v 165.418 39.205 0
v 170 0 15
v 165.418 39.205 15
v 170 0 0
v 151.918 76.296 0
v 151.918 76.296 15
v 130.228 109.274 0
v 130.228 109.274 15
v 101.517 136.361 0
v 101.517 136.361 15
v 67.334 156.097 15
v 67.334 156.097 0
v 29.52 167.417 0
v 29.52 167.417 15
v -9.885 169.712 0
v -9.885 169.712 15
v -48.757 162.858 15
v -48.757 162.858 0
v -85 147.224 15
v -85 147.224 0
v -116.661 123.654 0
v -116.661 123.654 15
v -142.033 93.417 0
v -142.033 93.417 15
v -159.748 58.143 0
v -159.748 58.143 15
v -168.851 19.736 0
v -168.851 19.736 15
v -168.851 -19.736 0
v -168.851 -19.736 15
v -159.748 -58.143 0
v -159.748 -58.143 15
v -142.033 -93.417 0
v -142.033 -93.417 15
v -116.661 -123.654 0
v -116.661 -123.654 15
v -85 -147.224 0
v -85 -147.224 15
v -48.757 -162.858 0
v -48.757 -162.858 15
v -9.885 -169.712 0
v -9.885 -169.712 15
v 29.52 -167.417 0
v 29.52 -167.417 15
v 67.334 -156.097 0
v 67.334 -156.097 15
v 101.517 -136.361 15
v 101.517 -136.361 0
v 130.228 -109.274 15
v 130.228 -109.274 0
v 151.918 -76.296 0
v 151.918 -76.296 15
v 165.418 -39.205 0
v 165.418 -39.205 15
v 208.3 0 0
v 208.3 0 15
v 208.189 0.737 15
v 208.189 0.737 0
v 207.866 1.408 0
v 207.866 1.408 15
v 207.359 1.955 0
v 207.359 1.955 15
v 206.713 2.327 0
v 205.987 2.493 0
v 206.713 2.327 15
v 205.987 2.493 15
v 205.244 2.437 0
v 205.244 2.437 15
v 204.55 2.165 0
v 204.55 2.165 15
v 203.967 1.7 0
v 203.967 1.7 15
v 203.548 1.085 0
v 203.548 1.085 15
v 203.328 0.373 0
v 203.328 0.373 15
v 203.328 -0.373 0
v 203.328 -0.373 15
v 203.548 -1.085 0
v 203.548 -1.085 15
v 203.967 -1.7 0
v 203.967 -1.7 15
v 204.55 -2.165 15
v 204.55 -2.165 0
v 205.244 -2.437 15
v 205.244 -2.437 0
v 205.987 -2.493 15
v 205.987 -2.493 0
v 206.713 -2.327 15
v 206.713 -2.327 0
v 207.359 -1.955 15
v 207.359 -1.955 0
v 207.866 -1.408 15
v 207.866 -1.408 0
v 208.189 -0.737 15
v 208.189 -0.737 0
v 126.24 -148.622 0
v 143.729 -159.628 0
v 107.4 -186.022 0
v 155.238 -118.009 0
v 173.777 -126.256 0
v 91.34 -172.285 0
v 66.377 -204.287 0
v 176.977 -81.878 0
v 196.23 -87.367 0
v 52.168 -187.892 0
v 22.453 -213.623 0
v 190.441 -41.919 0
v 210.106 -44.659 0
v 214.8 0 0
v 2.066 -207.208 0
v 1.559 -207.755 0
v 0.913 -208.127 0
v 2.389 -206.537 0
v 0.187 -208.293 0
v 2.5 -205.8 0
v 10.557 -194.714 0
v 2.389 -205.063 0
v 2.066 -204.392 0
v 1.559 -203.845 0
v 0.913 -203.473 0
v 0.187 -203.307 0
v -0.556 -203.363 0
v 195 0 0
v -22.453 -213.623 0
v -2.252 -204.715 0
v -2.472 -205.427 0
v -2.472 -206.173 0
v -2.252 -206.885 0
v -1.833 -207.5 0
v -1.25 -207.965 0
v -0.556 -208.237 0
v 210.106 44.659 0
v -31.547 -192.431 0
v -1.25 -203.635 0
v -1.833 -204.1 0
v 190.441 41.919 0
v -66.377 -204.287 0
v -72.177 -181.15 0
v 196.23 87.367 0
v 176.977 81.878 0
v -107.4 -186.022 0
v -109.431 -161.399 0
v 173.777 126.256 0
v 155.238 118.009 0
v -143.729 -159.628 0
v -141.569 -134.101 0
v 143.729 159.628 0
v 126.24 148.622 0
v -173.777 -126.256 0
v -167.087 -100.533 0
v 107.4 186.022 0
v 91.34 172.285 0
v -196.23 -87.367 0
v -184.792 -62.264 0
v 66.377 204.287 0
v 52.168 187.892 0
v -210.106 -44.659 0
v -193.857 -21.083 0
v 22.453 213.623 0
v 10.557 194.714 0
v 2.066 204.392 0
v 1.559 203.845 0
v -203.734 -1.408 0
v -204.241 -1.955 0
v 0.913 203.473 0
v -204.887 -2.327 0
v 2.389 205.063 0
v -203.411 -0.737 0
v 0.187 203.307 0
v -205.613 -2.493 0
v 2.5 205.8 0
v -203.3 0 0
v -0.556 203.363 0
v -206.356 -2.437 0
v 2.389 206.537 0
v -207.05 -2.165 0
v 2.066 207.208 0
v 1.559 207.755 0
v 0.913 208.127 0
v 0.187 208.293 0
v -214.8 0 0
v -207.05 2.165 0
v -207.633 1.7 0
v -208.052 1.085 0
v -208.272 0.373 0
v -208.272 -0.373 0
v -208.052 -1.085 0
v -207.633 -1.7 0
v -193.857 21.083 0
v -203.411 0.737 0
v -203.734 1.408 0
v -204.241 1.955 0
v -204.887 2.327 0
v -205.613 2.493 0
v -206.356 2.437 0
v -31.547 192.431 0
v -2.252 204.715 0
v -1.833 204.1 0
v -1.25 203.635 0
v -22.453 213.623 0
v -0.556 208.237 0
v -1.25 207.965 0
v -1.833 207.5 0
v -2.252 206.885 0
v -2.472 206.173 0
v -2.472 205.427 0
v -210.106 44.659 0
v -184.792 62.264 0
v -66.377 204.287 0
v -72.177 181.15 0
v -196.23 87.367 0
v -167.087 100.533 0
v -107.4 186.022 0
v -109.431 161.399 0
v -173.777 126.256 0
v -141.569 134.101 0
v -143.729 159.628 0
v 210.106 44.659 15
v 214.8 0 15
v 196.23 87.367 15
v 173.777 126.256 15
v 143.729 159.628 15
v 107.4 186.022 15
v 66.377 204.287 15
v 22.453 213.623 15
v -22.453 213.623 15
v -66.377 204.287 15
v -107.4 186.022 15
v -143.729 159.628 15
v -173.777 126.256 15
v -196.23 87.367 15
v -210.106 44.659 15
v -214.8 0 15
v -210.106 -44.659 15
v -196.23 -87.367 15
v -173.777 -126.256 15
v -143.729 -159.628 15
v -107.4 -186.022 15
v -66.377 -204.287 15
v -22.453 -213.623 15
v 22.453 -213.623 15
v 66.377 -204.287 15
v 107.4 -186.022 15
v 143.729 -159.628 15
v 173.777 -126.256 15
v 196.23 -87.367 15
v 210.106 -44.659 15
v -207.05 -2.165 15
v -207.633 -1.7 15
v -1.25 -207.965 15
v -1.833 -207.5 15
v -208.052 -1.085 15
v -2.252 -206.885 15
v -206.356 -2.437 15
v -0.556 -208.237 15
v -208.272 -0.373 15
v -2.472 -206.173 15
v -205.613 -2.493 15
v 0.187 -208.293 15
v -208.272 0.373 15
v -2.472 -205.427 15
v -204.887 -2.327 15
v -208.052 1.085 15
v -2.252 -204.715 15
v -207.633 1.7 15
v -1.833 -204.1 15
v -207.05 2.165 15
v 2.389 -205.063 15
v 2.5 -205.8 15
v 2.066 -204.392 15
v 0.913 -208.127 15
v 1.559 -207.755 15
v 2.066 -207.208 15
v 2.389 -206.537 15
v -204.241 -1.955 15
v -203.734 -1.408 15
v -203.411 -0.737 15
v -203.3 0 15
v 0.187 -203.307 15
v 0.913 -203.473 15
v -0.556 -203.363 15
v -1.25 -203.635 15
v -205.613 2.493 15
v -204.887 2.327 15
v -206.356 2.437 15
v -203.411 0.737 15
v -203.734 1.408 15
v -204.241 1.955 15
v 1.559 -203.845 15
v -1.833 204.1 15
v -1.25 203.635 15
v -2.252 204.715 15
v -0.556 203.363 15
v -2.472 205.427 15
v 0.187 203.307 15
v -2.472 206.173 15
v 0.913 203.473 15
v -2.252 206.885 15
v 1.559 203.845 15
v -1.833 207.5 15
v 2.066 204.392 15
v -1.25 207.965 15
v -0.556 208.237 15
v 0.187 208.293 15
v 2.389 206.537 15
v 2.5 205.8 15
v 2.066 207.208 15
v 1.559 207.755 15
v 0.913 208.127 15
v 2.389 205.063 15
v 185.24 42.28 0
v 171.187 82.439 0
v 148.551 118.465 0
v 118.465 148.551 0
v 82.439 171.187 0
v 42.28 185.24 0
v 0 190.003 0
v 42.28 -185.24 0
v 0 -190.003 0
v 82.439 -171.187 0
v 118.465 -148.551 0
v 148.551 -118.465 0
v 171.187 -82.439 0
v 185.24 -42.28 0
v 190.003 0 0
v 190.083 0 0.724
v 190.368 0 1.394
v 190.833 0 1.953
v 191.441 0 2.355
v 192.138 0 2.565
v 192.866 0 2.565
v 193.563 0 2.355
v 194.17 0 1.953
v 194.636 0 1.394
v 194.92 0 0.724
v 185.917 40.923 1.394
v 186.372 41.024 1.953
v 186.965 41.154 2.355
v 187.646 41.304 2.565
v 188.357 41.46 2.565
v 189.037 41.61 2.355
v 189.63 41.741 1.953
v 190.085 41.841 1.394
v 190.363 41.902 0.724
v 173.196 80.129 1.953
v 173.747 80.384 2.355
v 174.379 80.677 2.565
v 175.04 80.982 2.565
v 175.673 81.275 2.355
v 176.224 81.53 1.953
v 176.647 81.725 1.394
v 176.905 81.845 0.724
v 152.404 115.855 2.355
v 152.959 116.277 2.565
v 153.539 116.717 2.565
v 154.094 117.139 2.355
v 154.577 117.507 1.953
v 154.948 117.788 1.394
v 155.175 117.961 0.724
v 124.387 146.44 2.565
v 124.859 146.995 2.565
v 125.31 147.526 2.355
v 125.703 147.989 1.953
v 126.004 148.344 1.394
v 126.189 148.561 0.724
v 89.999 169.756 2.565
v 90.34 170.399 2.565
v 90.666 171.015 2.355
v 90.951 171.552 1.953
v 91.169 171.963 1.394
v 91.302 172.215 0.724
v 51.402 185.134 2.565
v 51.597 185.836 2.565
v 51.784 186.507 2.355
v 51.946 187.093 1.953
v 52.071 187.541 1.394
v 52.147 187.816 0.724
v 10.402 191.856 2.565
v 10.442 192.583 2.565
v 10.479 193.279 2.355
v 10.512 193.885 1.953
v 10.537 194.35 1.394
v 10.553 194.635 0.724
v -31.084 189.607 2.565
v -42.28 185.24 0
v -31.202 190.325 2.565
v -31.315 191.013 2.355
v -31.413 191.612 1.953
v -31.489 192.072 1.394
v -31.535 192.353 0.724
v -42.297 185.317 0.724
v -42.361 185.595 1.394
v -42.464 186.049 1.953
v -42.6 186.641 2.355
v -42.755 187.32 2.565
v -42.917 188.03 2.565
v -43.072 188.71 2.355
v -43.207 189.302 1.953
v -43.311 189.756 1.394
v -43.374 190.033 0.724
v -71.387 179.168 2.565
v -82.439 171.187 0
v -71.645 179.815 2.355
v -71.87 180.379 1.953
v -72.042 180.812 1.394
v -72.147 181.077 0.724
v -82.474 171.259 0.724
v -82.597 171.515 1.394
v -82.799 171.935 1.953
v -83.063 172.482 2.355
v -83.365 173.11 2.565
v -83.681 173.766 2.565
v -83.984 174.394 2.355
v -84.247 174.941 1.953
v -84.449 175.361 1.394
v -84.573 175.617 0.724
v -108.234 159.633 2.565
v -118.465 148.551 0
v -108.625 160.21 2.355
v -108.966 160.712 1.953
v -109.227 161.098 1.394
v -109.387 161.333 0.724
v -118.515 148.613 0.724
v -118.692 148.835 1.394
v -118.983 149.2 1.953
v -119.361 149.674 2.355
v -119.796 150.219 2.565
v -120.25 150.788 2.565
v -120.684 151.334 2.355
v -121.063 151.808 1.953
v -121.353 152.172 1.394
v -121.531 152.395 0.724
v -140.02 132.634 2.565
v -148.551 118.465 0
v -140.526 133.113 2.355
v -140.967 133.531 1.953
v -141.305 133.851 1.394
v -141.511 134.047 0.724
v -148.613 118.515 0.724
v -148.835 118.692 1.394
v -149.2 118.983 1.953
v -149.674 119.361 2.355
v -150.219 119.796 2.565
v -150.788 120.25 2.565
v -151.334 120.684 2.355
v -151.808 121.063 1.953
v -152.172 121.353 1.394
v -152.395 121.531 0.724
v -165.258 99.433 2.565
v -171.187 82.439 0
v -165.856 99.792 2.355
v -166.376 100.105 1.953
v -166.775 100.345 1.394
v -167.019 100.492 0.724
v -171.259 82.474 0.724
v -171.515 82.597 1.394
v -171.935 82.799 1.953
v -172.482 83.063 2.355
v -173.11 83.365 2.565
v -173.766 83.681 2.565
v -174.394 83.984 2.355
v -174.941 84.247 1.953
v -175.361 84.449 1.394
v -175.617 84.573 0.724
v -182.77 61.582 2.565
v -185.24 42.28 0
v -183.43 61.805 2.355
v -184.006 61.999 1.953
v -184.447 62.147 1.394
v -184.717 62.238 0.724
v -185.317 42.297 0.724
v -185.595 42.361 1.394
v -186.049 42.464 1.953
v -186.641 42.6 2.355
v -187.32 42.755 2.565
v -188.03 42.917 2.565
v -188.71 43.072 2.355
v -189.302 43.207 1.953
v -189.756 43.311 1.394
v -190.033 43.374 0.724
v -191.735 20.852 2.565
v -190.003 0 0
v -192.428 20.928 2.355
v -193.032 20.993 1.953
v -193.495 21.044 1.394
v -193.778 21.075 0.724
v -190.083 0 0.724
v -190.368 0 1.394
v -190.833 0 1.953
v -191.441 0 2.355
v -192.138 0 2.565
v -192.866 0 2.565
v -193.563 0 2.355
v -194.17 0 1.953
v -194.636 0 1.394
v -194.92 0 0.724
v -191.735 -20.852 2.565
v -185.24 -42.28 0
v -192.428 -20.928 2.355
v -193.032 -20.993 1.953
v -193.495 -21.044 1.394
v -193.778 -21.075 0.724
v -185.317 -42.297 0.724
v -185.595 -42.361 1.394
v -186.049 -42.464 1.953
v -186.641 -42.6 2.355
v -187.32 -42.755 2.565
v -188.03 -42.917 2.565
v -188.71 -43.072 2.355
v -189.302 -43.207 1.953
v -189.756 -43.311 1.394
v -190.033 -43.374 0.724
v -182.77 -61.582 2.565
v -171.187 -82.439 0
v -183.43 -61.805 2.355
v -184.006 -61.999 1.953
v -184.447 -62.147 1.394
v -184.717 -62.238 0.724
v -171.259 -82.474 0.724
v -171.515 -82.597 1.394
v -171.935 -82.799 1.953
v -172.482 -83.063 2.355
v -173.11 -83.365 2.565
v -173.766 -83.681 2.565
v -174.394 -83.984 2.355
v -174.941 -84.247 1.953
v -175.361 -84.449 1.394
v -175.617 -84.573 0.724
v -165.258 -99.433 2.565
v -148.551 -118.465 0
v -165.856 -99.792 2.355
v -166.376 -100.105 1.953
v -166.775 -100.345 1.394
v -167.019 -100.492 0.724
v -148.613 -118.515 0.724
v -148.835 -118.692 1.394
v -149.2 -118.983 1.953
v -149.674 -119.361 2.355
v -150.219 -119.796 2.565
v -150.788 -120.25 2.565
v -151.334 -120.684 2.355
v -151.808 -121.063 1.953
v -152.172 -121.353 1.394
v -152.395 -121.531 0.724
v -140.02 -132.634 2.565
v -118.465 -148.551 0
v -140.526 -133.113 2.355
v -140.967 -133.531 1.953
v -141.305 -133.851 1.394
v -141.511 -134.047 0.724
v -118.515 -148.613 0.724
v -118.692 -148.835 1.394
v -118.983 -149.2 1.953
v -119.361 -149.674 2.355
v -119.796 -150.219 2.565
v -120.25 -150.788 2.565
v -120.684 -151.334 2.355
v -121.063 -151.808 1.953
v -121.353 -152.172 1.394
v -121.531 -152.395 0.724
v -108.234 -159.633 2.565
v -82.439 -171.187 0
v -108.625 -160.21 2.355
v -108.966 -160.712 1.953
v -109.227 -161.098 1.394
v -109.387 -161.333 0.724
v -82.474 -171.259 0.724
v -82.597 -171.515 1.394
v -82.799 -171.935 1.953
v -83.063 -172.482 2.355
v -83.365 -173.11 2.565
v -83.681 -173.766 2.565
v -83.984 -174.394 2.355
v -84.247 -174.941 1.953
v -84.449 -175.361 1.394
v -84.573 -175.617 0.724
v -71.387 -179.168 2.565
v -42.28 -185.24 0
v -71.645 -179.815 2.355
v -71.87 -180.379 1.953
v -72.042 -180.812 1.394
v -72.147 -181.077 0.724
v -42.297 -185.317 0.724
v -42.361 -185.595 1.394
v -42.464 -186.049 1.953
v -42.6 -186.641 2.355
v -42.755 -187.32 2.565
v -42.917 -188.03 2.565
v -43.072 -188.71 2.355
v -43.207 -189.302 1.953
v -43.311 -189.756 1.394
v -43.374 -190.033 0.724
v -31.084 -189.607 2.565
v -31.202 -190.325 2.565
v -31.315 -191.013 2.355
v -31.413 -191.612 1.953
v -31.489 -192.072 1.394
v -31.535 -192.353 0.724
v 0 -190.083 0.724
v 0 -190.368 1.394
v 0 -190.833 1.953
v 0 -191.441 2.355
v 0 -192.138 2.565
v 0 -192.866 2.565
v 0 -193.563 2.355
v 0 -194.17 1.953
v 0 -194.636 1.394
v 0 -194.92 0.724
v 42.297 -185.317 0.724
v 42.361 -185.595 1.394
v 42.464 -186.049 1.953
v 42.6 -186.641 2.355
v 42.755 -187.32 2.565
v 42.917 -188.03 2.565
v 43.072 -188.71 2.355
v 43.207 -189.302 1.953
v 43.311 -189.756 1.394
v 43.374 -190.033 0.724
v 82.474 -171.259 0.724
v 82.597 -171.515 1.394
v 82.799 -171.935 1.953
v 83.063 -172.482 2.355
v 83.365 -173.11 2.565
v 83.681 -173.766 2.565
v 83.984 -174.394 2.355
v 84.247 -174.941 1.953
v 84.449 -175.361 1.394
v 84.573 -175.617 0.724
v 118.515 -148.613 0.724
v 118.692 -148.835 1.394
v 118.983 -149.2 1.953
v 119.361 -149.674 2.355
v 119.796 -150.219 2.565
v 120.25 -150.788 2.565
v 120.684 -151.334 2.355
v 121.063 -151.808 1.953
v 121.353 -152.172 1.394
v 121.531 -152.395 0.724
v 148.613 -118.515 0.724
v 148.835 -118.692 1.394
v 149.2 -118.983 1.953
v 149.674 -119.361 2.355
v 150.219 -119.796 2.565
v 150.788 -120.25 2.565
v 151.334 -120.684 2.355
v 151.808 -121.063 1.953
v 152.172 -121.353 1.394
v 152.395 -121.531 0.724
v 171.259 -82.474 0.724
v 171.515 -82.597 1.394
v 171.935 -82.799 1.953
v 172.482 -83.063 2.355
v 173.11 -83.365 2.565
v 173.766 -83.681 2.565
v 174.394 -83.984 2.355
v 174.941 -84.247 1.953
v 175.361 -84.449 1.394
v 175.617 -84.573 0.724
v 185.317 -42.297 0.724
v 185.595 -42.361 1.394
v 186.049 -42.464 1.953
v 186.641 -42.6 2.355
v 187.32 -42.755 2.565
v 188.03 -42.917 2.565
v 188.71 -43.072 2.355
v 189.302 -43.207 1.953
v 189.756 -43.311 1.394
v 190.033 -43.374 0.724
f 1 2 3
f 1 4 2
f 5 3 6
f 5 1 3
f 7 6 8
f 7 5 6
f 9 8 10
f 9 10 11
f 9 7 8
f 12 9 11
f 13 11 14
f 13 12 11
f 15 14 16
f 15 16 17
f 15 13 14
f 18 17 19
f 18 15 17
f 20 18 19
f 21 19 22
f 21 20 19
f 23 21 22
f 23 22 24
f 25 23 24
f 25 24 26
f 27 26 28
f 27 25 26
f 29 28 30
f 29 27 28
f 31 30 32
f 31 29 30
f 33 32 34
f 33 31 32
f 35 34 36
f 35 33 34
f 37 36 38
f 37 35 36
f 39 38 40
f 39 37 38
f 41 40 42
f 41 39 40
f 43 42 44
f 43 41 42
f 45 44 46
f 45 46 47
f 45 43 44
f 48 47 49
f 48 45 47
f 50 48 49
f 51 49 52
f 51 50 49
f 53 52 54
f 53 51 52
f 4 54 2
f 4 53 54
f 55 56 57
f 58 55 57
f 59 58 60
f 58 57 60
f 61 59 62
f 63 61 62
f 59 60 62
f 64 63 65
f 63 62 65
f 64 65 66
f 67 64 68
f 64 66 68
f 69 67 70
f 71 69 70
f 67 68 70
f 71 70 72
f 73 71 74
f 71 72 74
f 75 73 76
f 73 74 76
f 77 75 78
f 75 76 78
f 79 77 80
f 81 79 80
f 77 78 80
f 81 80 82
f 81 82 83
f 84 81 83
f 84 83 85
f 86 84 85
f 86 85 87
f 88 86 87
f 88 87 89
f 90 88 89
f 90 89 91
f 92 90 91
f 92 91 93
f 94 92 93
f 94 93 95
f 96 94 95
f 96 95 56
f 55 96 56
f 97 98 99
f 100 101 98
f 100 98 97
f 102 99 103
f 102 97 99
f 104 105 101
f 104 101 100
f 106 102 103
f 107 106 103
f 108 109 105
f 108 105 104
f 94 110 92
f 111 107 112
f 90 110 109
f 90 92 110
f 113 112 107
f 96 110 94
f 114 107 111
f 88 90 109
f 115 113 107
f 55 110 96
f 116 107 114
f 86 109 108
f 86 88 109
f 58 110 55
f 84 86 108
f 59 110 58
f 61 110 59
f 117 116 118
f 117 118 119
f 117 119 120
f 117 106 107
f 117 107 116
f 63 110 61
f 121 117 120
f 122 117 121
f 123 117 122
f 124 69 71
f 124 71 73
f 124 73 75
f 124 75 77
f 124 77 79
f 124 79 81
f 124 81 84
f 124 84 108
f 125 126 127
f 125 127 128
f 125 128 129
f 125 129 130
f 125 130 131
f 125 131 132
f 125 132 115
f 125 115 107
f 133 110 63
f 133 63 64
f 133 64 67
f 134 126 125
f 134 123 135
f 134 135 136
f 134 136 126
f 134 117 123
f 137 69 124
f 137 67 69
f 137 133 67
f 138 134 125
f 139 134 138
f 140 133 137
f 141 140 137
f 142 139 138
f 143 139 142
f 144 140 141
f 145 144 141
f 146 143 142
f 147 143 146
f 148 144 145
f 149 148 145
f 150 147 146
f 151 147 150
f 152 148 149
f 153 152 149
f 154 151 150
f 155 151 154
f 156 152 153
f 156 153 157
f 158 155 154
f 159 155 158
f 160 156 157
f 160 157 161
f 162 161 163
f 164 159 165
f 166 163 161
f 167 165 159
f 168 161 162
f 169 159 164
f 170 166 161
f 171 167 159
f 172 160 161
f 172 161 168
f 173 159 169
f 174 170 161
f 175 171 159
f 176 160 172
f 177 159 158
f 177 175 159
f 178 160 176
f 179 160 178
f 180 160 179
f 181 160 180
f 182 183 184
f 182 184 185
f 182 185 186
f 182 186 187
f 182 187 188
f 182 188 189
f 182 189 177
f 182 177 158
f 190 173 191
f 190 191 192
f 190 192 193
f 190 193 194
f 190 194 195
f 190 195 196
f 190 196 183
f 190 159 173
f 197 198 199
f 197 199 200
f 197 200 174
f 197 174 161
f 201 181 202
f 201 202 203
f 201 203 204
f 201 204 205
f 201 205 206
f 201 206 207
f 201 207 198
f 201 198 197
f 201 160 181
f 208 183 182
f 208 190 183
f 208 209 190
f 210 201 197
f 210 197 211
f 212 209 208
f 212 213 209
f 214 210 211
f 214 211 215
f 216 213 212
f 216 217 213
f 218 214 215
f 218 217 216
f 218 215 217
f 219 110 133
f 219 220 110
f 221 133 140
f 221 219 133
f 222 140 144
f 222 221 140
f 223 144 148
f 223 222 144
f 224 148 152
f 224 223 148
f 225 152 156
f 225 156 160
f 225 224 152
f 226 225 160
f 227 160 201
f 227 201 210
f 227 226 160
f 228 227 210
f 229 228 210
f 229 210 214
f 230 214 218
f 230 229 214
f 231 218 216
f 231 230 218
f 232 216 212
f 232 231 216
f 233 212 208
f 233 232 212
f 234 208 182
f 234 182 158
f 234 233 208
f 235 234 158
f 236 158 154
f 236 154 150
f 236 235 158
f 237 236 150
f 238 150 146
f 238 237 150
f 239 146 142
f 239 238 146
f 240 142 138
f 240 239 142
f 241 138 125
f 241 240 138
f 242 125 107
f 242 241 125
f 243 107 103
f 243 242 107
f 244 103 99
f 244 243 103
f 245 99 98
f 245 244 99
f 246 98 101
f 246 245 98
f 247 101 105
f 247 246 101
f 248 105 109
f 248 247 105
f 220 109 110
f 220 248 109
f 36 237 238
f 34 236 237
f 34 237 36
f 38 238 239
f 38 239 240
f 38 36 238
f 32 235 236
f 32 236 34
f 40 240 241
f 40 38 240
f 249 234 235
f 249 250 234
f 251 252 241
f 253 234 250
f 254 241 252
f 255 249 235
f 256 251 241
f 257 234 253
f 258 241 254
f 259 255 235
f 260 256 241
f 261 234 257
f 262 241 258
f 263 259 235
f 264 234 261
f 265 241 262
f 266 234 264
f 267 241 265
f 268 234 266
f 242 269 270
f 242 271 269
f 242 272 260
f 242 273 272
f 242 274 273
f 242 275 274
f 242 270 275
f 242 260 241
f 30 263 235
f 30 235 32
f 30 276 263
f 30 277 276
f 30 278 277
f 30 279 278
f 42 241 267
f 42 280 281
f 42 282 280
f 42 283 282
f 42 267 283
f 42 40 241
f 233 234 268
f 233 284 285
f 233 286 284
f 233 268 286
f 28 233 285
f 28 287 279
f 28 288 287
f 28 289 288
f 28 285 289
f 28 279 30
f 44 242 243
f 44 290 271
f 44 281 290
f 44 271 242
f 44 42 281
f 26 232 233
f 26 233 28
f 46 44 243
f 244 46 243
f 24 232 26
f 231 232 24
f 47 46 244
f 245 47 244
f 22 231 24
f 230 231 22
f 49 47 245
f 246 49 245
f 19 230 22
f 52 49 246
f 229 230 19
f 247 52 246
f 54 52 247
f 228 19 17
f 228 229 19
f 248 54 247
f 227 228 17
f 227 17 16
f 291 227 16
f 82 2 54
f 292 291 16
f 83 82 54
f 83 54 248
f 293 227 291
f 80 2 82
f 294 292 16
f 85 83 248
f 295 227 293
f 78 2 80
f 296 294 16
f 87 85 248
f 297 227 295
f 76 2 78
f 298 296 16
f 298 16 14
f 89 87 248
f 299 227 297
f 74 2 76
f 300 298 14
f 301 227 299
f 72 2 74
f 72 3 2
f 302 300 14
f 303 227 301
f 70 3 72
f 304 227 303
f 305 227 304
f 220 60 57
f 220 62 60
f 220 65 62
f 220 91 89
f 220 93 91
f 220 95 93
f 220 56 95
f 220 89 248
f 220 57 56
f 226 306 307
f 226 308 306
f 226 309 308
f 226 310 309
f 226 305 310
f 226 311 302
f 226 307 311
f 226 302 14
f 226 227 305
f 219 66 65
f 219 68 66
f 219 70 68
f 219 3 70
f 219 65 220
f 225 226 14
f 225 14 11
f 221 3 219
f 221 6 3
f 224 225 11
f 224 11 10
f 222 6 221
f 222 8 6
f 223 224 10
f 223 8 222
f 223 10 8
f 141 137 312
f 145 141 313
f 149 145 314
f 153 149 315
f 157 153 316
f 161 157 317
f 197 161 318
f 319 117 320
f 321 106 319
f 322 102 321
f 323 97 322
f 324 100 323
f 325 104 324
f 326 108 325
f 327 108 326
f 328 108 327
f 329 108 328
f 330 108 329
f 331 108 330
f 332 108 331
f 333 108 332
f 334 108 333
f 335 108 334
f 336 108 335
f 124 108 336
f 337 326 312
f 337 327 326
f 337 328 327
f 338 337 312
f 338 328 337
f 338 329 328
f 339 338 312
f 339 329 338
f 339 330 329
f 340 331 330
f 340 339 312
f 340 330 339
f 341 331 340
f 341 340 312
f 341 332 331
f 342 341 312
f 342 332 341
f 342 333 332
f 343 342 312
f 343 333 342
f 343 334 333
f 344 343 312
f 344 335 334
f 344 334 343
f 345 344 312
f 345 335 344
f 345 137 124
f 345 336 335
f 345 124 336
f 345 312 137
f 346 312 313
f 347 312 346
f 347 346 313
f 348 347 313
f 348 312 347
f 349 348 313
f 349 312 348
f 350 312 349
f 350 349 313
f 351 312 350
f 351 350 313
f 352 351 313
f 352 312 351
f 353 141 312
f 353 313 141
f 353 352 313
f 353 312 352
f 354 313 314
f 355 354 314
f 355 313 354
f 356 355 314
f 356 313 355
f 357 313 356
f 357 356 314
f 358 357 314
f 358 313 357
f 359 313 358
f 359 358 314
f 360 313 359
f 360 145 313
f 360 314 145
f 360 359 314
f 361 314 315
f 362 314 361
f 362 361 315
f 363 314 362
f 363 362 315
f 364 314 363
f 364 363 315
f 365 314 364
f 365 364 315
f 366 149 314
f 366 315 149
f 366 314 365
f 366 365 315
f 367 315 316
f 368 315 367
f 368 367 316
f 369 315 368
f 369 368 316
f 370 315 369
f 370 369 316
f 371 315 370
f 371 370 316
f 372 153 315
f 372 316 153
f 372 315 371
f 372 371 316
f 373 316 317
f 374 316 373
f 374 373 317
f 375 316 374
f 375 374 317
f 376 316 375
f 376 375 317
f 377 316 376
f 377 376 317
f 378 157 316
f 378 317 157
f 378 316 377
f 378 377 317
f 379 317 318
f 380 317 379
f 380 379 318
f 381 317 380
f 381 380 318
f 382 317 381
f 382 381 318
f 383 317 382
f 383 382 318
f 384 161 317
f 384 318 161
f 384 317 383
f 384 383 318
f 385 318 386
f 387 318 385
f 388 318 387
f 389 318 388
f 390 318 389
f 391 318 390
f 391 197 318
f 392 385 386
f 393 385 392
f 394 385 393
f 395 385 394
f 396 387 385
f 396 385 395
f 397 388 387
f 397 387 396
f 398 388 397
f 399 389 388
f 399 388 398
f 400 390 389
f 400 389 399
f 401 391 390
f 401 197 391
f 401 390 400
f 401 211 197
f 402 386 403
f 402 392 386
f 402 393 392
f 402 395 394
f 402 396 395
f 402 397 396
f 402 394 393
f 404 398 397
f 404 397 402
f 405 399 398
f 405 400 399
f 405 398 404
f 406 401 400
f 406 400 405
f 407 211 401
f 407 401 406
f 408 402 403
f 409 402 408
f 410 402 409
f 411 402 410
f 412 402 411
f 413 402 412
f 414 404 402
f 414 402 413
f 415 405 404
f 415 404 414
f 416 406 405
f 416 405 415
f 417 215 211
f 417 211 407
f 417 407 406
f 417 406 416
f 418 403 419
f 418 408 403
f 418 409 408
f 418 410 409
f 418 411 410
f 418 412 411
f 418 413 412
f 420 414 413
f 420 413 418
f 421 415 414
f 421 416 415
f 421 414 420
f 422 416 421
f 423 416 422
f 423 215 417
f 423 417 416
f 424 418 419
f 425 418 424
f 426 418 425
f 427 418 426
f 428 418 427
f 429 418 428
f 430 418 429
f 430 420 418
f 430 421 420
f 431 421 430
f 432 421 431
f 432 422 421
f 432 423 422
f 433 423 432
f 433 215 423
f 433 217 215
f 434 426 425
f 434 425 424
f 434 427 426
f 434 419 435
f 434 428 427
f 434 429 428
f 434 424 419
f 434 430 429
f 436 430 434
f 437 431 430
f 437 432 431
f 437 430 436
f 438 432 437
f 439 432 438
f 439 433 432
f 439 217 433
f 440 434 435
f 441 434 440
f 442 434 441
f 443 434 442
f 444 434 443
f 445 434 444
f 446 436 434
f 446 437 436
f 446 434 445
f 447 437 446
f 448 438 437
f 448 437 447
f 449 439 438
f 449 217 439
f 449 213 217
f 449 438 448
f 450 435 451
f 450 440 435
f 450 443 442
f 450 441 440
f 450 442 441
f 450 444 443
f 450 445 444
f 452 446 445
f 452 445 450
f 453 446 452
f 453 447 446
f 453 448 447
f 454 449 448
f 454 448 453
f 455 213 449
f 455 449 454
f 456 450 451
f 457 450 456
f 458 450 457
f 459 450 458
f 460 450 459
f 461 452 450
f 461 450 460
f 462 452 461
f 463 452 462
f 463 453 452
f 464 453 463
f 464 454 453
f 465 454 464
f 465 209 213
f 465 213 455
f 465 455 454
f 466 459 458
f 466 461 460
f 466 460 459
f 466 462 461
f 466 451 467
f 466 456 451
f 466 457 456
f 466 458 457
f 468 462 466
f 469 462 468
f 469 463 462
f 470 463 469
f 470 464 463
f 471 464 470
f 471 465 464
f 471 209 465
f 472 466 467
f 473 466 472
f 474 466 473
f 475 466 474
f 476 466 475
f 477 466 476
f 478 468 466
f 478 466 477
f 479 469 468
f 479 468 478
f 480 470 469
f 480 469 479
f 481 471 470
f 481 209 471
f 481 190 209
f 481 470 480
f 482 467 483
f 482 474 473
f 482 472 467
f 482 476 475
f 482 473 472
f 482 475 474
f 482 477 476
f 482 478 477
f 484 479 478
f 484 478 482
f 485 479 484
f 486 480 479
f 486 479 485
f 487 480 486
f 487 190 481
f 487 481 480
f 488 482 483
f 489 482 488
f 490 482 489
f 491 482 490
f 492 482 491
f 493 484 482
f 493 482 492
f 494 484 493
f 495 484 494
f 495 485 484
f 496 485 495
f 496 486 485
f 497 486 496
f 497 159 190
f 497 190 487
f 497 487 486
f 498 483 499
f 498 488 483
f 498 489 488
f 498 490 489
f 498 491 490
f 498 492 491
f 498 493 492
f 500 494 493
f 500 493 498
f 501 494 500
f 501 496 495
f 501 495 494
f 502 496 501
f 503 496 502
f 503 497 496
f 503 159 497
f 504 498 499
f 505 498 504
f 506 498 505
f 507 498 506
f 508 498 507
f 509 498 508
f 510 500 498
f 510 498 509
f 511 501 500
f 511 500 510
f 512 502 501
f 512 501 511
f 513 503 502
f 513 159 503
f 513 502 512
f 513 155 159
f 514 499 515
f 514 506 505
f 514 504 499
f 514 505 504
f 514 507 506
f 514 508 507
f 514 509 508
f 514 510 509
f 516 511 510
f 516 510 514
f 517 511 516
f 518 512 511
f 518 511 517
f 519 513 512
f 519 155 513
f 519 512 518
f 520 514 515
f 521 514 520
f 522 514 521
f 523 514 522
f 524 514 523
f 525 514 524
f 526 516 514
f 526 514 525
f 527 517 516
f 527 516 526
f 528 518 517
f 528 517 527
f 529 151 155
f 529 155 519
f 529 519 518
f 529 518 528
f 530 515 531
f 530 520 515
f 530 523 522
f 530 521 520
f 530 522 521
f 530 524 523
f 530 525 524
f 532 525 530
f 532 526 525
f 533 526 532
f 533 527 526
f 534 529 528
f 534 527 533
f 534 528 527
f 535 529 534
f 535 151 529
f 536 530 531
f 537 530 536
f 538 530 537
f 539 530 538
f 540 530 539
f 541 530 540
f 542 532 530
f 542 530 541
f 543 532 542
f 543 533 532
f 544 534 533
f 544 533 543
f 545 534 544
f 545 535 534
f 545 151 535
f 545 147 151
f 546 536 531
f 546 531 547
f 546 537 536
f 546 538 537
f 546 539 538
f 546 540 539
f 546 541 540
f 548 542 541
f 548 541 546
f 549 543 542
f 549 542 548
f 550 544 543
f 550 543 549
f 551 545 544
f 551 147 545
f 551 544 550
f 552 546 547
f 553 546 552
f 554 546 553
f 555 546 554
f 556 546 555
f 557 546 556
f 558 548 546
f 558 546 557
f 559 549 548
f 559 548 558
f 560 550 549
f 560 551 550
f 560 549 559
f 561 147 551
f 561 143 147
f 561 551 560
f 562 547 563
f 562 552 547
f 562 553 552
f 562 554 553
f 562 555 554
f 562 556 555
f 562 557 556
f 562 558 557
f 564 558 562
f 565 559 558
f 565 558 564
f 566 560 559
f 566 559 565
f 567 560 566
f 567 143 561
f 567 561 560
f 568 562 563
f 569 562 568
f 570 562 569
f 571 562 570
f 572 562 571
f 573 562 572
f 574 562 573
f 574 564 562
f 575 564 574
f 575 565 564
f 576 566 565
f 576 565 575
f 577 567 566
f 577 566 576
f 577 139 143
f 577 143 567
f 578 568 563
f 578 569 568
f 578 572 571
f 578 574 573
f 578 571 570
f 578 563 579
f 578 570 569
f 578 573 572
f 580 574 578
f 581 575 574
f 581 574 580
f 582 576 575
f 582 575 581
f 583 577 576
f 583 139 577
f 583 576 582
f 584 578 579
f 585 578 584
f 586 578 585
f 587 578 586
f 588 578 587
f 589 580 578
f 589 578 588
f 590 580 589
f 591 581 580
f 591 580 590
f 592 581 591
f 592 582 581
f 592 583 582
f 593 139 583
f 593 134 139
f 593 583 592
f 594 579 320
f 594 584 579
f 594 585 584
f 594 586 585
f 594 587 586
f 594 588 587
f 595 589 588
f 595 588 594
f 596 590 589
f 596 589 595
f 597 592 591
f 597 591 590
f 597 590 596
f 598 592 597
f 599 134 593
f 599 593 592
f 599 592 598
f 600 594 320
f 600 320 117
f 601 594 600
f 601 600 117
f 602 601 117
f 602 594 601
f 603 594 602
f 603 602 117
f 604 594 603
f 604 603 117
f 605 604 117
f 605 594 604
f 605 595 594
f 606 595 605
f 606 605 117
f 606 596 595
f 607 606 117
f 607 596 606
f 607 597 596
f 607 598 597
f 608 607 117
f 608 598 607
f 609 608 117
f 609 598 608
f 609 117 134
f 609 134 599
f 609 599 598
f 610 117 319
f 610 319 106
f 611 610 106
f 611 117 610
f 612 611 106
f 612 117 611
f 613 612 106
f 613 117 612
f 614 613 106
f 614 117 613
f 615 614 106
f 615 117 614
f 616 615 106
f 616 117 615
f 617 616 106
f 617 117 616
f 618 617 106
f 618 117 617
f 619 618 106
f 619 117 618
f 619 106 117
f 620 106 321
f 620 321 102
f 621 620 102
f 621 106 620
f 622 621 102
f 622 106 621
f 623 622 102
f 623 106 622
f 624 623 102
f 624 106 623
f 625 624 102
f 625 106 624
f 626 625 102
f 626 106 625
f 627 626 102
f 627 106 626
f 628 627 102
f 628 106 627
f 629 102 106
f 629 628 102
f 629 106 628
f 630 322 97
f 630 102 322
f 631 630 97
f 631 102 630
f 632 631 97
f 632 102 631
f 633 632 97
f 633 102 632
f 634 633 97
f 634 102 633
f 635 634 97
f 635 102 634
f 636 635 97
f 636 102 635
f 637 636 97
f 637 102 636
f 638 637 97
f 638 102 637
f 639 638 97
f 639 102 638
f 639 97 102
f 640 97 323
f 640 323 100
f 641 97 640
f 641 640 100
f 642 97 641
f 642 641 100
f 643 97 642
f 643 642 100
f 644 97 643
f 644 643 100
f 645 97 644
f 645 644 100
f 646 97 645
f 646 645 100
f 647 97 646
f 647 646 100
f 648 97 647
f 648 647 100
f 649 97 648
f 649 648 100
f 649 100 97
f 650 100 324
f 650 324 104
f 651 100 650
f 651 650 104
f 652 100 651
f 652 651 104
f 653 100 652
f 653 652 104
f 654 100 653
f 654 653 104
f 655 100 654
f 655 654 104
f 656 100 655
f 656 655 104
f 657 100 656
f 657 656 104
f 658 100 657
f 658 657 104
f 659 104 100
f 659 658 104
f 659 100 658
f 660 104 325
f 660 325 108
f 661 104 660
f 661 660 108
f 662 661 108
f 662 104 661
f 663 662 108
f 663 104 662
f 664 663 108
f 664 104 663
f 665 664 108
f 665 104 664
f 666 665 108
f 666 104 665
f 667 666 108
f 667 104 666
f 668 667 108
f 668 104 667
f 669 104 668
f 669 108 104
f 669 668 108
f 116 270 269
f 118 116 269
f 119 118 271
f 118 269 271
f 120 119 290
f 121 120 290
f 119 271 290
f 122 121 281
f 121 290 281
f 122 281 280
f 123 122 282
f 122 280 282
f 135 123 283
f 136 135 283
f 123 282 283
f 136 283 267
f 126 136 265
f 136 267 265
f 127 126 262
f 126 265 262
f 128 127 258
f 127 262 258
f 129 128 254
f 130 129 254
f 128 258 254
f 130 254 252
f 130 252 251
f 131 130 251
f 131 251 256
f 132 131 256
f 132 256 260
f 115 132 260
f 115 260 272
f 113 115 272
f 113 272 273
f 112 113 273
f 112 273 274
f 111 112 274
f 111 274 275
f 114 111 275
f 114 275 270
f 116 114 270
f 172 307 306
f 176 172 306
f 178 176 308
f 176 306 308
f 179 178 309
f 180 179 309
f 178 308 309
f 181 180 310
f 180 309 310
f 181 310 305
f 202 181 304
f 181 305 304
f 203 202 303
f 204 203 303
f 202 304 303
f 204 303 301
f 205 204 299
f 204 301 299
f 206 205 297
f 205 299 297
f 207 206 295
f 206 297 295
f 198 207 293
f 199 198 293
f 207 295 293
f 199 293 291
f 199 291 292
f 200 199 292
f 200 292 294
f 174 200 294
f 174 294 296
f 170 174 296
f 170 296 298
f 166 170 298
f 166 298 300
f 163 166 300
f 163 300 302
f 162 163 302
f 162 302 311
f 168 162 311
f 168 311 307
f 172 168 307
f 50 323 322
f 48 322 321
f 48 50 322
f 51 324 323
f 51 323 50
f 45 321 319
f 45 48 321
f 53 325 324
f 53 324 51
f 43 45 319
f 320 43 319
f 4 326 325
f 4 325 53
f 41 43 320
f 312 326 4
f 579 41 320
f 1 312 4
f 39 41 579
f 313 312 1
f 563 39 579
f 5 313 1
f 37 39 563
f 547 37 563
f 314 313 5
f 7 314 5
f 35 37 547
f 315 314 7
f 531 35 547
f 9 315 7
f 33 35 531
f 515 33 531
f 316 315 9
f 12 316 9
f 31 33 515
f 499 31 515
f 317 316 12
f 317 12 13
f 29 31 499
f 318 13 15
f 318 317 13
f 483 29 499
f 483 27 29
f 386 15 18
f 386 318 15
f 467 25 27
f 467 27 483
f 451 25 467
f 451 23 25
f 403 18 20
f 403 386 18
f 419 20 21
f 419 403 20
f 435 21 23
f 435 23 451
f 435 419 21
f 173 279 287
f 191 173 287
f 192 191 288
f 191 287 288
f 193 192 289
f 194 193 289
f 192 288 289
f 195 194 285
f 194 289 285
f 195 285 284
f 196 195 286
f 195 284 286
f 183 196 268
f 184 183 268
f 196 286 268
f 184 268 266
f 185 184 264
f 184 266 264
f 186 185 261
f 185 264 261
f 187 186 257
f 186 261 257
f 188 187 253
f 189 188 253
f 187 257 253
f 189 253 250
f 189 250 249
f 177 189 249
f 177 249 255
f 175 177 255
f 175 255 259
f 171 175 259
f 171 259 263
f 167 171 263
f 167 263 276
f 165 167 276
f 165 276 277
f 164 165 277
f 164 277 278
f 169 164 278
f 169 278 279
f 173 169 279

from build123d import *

# Parameters (mm, degrees)
F2_R     = 2.5
F3_DEPTH = 25


with BuildPart() as f1:
    # F0 (on Front) → F1 (revolve)
    with BuildSketch(Plane.XZ):
        with BuildLine():
            Line((195, 0), (214.8, 0))
            Line((214.8, 0), (214.8, 15))
            Line((214.8, 15), (170, 15))
            Line((170, 15), (170, 0))
            Line((170, 0), (190.003342, 0))
            ThreePointArc((190.003342, 0), (192.501671, 2.591396), (195, 0))
        make_face()
    revolve(axis=Axis((0, 0, 19.496838), (0, 0, 1)))

    # F2 (on face) → F3 (cut)
    with BuildSketch(Plane.XY.offset(15)):
        with Locations((205.8, 0)):
            Circle(F2_R)
        with Locations((0, 205.8)):
            Circle(F2_R)
        with Locations((-205.8, 0)):
            Circle(F2_R)
        with Locations((0, -205.8)):
            Circle(F2_R)
    extrude(amount=-F3_DEPTH, mode=Mode.SUBTRACT)


solid = f1.part
